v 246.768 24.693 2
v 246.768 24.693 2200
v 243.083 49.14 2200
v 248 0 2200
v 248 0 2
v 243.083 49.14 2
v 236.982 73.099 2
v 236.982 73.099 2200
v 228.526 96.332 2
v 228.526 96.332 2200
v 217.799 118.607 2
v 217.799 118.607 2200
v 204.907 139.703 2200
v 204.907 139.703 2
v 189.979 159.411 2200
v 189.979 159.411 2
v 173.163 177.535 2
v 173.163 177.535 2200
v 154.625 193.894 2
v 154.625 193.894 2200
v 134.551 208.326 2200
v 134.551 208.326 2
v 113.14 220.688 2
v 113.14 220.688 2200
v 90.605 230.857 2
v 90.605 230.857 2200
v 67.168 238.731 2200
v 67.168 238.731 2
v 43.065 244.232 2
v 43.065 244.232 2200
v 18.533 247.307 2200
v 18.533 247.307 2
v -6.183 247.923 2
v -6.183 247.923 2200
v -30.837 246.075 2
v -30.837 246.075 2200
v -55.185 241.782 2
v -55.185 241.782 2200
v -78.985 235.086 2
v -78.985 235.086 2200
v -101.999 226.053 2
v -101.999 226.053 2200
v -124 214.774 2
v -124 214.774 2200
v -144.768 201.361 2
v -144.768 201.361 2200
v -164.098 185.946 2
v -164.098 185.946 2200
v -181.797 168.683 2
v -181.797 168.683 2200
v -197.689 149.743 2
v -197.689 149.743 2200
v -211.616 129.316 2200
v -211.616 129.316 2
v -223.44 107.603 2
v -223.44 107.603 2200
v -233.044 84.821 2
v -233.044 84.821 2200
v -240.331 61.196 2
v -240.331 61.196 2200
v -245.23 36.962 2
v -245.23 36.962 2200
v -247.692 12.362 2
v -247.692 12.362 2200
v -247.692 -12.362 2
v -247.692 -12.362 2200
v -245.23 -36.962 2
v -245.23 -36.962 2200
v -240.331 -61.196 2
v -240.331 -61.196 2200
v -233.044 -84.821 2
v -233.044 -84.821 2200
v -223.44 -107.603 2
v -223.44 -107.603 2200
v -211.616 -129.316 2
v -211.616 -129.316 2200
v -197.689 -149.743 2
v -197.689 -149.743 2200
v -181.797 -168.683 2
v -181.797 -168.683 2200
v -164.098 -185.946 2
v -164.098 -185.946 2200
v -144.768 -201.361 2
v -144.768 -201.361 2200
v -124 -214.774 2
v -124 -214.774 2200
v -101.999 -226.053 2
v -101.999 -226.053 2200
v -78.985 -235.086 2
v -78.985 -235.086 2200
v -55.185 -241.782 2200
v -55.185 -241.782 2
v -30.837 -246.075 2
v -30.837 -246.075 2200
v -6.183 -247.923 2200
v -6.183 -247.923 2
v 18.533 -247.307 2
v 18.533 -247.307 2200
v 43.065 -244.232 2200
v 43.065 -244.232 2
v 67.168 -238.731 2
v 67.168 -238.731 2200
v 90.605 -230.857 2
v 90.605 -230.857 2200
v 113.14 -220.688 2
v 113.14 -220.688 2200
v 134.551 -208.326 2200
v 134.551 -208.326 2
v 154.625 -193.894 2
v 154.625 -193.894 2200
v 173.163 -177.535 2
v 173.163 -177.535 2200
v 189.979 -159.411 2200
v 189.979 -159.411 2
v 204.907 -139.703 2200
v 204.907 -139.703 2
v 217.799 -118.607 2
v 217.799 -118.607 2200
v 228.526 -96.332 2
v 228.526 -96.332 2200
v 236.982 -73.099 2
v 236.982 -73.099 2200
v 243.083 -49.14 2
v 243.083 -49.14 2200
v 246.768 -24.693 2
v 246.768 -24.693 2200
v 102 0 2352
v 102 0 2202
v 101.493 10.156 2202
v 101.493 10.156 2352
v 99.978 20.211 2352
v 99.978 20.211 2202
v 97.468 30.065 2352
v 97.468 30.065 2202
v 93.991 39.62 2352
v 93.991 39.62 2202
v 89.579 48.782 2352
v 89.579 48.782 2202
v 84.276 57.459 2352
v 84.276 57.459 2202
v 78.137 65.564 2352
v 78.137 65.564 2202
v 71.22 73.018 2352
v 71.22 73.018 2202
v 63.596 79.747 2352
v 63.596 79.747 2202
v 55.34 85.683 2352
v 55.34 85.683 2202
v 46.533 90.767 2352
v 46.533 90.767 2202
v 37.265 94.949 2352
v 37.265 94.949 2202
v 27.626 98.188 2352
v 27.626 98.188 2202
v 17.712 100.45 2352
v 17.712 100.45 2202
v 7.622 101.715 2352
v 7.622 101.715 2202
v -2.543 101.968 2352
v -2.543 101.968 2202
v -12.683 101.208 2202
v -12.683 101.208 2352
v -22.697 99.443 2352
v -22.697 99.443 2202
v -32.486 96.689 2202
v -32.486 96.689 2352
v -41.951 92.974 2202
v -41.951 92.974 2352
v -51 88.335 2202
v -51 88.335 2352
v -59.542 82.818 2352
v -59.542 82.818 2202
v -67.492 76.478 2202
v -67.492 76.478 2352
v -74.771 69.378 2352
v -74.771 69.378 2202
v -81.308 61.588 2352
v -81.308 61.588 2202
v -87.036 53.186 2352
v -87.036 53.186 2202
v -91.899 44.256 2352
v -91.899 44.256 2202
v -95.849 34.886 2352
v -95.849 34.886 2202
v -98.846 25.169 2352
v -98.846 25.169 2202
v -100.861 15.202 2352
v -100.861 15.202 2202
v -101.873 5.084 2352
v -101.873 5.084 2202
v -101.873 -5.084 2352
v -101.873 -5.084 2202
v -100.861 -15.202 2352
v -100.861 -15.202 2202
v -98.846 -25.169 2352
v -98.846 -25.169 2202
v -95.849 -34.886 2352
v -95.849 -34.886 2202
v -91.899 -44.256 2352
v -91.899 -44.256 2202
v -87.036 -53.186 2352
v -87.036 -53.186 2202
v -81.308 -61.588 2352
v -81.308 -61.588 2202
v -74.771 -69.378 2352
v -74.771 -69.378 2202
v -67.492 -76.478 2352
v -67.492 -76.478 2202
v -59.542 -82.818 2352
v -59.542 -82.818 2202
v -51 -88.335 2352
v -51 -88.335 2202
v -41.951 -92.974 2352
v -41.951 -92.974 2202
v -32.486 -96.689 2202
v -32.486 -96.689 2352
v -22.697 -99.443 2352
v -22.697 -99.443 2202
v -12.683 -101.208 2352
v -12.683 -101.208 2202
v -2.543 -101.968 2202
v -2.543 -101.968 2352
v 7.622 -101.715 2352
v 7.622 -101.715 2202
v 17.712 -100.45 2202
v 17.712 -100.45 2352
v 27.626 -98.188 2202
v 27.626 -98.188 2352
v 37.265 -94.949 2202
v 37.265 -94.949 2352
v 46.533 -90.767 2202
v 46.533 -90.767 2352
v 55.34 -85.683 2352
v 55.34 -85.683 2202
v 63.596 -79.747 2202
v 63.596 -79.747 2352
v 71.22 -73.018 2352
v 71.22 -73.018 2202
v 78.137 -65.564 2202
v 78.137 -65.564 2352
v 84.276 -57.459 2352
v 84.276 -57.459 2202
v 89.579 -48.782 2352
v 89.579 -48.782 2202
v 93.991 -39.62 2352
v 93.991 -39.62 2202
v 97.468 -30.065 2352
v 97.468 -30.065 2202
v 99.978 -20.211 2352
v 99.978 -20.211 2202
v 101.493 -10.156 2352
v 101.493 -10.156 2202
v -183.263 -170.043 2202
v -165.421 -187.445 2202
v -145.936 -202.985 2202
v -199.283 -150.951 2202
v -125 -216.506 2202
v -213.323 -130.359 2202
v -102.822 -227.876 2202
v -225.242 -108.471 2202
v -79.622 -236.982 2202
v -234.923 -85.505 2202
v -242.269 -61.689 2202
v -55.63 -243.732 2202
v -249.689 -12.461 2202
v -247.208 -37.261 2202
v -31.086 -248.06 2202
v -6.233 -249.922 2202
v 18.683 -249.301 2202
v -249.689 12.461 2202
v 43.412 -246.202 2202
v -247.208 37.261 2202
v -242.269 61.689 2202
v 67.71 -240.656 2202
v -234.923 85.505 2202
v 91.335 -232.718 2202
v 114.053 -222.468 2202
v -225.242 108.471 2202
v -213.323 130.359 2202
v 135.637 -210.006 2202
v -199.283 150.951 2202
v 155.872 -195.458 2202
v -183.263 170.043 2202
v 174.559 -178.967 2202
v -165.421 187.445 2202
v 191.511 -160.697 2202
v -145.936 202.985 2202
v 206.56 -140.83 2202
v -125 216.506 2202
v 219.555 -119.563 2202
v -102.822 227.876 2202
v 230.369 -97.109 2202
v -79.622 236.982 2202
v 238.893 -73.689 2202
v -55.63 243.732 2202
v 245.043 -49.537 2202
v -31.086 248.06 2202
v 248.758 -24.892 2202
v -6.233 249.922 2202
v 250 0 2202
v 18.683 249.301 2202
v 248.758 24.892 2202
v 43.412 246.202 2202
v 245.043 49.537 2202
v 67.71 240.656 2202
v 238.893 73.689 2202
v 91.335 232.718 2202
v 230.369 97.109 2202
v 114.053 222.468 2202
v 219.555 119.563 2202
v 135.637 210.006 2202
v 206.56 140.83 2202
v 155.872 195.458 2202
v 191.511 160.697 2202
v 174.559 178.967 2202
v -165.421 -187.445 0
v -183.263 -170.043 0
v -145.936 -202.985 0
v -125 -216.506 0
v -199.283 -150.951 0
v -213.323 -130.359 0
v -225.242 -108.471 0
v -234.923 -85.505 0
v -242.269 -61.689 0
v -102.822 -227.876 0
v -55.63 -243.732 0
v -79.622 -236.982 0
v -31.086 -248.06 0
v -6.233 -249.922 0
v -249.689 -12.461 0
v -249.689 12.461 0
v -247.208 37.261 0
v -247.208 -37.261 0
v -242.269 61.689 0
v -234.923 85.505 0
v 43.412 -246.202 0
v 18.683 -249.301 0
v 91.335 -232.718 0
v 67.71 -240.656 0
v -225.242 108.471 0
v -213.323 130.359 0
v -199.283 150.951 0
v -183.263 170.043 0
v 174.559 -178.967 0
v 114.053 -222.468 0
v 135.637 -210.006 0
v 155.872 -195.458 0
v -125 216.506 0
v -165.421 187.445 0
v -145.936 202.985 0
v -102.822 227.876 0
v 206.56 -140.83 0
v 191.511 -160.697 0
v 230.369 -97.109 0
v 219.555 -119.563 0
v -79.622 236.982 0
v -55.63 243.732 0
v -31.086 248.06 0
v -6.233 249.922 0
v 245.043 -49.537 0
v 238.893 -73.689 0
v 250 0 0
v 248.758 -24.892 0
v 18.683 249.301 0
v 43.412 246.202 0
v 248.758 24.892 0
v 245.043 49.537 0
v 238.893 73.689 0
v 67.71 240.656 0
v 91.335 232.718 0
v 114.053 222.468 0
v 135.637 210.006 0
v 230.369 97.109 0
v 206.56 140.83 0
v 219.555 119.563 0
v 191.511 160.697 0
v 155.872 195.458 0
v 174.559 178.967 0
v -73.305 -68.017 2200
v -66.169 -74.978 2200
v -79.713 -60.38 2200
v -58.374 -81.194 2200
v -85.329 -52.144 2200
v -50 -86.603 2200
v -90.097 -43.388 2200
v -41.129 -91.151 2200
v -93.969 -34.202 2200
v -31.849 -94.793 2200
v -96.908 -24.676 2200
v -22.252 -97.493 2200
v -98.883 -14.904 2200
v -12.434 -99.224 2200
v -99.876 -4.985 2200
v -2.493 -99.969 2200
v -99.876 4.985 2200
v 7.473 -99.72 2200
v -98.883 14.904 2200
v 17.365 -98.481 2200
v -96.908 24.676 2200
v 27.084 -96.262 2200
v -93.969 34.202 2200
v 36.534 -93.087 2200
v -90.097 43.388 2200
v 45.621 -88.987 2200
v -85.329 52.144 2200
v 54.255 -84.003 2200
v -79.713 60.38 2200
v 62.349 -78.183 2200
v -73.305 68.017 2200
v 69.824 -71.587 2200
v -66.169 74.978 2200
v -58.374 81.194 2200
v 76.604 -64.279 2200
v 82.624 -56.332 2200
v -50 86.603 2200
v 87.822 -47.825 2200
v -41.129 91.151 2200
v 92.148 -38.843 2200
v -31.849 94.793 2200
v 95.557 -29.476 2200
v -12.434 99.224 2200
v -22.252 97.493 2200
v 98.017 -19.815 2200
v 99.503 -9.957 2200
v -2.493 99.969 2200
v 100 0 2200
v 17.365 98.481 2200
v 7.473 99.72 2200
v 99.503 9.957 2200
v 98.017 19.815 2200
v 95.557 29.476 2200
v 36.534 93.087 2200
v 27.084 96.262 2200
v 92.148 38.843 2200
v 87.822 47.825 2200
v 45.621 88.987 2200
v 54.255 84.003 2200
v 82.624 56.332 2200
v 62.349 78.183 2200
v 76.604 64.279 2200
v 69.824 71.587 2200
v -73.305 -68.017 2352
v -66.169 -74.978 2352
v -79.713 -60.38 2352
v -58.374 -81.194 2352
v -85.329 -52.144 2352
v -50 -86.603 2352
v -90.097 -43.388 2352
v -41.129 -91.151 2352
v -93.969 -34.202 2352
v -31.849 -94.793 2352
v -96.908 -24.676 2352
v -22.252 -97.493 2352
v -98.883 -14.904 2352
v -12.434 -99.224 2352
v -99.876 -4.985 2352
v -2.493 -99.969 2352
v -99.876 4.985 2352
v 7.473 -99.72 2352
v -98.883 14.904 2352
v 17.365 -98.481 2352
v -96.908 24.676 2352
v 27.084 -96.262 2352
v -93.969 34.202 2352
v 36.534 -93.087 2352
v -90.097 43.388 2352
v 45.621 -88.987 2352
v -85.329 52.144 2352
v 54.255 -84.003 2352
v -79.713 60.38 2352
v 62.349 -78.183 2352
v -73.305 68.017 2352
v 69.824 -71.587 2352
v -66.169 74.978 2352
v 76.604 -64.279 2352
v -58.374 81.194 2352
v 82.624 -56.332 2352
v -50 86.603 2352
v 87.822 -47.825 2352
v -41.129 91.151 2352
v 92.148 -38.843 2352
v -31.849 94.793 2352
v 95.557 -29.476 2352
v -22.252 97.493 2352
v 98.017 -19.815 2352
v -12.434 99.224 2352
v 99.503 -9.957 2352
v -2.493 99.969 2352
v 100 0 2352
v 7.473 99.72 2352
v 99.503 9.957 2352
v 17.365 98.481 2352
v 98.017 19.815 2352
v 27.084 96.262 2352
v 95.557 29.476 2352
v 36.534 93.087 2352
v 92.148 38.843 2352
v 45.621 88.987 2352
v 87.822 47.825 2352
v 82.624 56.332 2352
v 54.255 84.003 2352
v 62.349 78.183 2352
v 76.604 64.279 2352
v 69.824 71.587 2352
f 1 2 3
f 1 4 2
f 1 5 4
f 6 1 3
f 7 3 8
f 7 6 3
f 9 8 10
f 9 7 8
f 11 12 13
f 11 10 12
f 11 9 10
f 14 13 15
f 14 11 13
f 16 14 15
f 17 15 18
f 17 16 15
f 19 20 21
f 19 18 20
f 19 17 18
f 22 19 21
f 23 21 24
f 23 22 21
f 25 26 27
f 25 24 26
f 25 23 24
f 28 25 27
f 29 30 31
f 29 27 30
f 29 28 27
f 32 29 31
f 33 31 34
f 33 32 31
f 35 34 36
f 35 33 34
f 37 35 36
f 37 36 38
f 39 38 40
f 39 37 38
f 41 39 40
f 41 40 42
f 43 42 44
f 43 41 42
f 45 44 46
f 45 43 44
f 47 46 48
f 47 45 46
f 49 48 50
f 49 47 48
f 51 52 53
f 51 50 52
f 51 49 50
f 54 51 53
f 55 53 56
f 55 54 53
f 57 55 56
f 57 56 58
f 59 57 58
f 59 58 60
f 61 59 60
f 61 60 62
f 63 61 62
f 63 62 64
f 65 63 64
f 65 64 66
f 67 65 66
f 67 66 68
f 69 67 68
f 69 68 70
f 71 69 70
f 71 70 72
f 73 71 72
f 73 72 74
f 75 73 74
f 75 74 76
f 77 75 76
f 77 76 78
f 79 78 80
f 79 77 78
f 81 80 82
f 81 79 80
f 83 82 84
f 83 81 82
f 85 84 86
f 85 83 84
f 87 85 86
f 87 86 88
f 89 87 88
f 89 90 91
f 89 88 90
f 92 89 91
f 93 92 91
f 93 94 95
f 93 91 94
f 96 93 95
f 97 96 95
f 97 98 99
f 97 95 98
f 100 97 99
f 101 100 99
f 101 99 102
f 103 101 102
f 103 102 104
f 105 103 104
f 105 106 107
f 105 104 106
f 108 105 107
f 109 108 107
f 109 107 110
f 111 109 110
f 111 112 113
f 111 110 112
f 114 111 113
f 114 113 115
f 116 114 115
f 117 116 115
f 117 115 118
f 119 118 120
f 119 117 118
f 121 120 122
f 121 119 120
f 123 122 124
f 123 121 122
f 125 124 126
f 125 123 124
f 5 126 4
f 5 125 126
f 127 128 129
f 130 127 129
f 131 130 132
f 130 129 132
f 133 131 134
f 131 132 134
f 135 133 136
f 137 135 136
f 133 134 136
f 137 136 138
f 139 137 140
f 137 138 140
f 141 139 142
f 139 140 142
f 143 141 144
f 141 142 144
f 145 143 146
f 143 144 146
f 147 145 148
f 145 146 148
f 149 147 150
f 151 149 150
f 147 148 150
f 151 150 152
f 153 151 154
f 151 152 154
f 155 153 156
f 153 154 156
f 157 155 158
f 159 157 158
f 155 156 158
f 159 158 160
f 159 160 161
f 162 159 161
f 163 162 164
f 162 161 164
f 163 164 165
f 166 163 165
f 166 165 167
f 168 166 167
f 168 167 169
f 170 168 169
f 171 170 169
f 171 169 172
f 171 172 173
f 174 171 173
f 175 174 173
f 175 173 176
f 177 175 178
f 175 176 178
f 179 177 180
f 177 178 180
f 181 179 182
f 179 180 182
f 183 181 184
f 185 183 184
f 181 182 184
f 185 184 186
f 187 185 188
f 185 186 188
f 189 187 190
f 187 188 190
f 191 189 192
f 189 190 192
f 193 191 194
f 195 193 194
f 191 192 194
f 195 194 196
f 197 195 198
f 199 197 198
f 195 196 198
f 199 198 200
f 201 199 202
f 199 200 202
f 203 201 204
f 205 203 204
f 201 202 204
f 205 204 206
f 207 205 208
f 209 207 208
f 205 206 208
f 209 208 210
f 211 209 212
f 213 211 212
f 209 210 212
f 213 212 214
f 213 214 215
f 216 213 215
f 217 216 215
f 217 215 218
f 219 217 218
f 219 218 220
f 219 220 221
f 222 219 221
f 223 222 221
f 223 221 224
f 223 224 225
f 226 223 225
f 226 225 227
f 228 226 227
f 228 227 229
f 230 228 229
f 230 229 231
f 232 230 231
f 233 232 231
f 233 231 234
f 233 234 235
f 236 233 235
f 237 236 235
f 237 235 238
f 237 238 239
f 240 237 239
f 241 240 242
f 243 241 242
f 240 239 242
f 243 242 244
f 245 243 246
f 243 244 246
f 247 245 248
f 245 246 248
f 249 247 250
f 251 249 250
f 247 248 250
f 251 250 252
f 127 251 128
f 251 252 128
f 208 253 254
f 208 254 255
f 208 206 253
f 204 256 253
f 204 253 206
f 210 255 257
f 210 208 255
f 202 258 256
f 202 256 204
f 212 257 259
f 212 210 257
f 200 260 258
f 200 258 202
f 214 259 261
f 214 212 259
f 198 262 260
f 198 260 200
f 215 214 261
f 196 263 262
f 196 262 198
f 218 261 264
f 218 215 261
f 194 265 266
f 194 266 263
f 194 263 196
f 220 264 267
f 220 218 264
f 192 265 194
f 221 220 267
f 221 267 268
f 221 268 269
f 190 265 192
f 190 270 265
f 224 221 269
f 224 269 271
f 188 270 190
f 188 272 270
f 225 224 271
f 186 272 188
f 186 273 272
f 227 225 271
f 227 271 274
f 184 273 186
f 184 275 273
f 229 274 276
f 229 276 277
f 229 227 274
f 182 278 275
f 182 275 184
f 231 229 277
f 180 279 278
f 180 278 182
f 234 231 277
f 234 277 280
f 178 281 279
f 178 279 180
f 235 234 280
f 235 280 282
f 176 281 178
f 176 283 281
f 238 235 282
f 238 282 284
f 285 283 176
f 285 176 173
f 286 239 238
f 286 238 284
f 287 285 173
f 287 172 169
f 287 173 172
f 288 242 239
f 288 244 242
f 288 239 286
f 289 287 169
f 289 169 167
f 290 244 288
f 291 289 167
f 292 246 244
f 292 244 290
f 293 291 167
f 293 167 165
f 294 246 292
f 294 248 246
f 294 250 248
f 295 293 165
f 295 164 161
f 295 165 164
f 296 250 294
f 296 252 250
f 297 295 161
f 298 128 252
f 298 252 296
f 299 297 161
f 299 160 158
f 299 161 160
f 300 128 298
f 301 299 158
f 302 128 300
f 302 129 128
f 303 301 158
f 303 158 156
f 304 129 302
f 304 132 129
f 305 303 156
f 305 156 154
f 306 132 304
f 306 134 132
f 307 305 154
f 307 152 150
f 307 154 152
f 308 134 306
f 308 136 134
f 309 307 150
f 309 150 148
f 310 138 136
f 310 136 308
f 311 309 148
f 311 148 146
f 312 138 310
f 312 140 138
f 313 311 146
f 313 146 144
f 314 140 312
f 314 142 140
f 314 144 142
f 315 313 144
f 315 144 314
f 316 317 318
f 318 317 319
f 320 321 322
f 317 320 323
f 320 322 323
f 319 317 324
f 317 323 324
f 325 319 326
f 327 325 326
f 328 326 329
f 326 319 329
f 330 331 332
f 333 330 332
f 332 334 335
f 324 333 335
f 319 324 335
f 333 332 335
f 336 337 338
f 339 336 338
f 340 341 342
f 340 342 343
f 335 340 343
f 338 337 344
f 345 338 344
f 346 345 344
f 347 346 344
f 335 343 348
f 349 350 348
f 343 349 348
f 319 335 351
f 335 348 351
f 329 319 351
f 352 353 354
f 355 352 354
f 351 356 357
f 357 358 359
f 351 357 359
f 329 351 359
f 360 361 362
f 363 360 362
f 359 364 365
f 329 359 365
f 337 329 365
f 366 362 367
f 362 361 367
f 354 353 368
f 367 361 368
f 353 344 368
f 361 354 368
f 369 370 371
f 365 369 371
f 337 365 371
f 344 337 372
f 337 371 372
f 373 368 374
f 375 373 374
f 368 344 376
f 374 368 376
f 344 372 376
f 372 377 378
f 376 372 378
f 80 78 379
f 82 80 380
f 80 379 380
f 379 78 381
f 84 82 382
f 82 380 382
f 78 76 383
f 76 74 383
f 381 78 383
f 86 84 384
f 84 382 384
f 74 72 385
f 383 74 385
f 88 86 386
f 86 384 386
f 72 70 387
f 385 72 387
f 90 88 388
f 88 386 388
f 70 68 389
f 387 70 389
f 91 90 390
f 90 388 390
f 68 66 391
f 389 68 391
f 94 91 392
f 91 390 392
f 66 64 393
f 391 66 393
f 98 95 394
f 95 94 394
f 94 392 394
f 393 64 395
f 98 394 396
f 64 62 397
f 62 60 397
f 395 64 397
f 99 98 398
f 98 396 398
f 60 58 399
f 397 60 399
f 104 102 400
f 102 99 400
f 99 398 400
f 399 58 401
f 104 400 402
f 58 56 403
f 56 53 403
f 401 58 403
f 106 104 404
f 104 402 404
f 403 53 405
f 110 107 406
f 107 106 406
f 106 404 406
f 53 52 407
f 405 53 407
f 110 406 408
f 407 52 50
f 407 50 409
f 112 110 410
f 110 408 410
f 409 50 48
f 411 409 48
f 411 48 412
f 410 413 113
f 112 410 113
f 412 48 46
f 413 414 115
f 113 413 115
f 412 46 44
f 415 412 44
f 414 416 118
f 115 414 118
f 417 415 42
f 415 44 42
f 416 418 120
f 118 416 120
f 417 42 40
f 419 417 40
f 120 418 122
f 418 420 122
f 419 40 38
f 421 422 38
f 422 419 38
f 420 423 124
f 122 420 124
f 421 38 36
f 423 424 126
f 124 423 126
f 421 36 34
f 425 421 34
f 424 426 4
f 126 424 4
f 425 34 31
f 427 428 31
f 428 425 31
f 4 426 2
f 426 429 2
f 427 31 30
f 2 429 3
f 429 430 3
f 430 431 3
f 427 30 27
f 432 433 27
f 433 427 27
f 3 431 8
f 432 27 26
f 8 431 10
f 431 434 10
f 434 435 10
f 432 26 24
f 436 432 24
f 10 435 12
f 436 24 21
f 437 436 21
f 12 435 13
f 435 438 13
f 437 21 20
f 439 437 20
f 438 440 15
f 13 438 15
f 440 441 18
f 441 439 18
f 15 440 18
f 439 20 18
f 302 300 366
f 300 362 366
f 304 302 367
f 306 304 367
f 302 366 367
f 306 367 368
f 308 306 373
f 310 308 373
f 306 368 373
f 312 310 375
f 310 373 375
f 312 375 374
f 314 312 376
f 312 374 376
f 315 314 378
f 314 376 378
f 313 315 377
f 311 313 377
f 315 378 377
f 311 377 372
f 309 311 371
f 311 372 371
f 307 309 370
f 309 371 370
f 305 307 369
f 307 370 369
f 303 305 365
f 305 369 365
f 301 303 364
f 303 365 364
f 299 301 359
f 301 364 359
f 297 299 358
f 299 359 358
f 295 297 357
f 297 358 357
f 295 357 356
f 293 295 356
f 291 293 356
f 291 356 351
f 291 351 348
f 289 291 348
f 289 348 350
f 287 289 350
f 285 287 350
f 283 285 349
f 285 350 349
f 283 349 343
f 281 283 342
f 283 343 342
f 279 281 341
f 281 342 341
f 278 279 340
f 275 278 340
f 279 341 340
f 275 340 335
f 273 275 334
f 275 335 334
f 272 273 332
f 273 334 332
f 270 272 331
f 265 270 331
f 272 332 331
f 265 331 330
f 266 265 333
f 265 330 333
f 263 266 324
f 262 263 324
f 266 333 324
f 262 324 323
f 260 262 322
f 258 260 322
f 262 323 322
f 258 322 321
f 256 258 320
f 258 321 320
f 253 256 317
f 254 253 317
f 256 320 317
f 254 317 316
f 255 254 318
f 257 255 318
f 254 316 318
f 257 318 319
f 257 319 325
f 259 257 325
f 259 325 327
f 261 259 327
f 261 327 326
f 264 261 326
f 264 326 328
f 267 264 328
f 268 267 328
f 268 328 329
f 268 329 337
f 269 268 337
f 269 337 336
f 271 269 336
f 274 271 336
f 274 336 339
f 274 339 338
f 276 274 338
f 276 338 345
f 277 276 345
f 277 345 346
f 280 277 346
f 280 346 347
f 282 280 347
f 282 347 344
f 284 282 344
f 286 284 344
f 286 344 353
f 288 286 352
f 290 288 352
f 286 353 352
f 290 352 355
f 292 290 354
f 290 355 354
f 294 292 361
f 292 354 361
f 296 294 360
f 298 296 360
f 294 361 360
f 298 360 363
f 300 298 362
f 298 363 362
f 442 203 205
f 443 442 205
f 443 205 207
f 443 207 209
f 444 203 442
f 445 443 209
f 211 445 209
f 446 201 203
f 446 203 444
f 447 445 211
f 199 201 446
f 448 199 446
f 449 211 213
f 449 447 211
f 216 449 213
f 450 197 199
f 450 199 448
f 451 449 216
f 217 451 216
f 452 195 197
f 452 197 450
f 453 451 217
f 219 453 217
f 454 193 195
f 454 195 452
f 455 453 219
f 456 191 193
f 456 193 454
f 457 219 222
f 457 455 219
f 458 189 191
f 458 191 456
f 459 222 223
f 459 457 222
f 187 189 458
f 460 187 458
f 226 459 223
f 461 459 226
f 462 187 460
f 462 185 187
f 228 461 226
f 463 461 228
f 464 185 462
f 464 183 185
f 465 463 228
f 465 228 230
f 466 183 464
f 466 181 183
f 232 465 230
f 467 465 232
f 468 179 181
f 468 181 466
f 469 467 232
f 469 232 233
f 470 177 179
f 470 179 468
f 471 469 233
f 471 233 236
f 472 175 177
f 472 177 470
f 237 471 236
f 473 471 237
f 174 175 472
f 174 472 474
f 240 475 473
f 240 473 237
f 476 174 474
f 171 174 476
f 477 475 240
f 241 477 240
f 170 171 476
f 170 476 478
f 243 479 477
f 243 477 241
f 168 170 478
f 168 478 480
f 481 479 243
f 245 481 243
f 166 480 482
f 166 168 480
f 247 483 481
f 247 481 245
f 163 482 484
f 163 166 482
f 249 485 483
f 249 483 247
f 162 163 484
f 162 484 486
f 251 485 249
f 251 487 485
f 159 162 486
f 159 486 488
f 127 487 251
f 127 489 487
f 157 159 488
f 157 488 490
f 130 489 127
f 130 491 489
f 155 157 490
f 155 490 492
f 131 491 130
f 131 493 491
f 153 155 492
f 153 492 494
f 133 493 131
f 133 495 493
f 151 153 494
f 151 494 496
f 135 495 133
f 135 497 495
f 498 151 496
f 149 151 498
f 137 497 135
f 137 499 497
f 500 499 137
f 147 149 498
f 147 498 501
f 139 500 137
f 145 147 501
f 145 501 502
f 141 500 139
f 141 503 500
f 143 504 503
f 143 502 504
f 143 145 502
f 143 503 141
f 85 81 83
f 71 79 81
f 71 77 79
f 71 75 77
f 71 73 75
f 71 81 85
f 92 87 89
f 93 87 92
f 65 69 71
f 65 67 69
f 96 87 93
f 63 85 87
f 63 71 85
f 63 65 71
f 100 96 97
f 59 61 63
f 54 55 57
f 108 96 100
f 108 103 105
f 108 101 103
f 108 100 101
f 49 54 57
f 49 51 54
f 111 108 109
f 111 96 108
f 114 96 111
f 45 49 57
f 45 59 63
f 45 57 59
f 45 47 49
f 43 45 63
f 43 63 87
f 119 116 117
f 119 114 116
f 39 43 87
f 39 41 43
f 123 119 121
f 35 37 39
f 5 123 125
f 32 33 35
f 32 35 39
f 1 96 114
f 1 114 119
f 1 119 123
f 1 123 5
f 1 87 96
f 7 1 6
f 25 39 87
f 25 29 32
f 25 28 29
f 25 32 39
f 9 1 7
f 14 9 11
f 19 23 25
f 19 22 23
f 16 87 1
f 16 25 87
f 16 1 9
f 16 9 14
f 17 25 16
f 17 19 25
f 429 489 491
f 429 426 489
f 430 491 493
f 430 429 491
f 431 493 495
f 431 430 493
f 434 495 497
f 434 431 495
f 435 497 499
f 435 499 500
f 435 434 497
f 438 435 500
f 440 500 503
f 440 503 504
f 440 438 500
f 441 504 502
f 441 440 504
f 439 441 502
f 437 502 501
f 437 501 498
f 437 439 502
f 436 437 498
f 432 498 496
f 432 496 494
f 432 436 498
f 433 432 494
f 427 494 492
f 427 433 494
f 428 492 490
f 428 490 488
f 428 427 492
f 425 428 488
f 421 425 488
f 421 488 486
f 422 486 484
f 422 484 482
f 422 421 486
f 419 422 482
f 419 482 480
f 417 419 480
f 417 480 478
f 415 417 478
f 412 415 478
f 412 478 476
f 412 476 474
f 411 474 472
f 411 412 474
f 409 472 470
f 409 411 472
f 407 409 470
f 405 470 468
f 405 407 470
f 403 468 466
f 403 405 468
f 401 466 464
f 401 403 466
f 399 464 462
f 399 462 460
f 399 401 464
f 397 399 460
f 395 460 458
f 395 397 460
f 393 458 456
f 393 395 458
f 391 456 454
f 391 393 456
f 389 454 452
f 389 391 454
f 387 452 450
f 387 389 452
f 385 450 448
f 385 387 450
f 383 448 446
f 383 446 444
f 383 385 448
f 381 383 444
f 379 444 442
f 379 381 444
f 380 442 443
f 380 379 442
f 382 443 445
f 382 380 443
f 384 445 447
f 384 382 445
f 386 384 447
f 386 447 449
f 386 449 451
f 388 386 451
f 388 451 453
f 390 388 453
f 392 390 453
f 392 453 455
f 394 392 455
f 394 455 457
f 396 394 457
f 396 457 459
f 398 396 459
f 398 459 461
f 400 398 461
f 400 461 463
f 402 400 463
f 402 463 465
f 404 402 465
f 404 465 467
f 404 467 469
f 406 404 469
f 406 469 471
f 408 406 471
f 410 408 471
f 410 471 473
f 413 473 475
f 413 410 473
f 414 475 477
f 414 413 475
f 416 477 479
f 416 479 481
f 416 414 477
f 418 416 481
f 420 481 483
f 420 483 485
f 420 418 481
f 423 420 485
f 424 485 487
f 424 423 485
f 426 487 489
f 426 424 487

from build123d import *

# Parameters (mm, degrees)
SKETCH1_R           = 250
BOSS_EXTRUDE1_DEPTH = 2200
SHELL1_T            = -2
SKETCH10_R          = 250
SKETCH10_R_2        = 100
BOSS_EXTRUDE4_DEPTH = 2
SKETCH11_R          = 102
SKETCH11_R_2        = 100
EXTRUDE_THIN2_DEPTH = 150


with BuildPart() as part:
    # Sketch1 → Boss-Extrude1 (new body)
    with BuildSketch(Plane.XY):
        Circle(SKETCH1_R)
    extrude(amount=BOSS_EXTRUDE1_DEPTH)

    # Shell1
    shell1_openings = [part.faces().sort_by_distance(p)[0] for p in [
        (0, 0, 2200),
    ]]
    offset(amount=SHELL1_T, openings=shell1_openings, kind=Kind.INTERSECTION)

    # Sketch10 → Boss-Extrude4 (add)
    with BuildSketch(Plane.XY.offset(2200)):
        Circle(SKETCH10_R)
        Circle(SKETCH10_R_2, mode=Mode.SUBTRACT)
    extrude(amount=BOSS_EXTRUDE4_DEPTH)

    # Sketch11 → Extrude-Thin2 (add)
    with BuildSketch(Plane.XY.offset(2202)):
        Circle(SKETCH11_R)
        Circle(SKETCH11_R_2, mode=Mode.SUBTRACT)
    extrude(amount=EXTRUDE_THIN2_DEPTH)


solid = part.part
